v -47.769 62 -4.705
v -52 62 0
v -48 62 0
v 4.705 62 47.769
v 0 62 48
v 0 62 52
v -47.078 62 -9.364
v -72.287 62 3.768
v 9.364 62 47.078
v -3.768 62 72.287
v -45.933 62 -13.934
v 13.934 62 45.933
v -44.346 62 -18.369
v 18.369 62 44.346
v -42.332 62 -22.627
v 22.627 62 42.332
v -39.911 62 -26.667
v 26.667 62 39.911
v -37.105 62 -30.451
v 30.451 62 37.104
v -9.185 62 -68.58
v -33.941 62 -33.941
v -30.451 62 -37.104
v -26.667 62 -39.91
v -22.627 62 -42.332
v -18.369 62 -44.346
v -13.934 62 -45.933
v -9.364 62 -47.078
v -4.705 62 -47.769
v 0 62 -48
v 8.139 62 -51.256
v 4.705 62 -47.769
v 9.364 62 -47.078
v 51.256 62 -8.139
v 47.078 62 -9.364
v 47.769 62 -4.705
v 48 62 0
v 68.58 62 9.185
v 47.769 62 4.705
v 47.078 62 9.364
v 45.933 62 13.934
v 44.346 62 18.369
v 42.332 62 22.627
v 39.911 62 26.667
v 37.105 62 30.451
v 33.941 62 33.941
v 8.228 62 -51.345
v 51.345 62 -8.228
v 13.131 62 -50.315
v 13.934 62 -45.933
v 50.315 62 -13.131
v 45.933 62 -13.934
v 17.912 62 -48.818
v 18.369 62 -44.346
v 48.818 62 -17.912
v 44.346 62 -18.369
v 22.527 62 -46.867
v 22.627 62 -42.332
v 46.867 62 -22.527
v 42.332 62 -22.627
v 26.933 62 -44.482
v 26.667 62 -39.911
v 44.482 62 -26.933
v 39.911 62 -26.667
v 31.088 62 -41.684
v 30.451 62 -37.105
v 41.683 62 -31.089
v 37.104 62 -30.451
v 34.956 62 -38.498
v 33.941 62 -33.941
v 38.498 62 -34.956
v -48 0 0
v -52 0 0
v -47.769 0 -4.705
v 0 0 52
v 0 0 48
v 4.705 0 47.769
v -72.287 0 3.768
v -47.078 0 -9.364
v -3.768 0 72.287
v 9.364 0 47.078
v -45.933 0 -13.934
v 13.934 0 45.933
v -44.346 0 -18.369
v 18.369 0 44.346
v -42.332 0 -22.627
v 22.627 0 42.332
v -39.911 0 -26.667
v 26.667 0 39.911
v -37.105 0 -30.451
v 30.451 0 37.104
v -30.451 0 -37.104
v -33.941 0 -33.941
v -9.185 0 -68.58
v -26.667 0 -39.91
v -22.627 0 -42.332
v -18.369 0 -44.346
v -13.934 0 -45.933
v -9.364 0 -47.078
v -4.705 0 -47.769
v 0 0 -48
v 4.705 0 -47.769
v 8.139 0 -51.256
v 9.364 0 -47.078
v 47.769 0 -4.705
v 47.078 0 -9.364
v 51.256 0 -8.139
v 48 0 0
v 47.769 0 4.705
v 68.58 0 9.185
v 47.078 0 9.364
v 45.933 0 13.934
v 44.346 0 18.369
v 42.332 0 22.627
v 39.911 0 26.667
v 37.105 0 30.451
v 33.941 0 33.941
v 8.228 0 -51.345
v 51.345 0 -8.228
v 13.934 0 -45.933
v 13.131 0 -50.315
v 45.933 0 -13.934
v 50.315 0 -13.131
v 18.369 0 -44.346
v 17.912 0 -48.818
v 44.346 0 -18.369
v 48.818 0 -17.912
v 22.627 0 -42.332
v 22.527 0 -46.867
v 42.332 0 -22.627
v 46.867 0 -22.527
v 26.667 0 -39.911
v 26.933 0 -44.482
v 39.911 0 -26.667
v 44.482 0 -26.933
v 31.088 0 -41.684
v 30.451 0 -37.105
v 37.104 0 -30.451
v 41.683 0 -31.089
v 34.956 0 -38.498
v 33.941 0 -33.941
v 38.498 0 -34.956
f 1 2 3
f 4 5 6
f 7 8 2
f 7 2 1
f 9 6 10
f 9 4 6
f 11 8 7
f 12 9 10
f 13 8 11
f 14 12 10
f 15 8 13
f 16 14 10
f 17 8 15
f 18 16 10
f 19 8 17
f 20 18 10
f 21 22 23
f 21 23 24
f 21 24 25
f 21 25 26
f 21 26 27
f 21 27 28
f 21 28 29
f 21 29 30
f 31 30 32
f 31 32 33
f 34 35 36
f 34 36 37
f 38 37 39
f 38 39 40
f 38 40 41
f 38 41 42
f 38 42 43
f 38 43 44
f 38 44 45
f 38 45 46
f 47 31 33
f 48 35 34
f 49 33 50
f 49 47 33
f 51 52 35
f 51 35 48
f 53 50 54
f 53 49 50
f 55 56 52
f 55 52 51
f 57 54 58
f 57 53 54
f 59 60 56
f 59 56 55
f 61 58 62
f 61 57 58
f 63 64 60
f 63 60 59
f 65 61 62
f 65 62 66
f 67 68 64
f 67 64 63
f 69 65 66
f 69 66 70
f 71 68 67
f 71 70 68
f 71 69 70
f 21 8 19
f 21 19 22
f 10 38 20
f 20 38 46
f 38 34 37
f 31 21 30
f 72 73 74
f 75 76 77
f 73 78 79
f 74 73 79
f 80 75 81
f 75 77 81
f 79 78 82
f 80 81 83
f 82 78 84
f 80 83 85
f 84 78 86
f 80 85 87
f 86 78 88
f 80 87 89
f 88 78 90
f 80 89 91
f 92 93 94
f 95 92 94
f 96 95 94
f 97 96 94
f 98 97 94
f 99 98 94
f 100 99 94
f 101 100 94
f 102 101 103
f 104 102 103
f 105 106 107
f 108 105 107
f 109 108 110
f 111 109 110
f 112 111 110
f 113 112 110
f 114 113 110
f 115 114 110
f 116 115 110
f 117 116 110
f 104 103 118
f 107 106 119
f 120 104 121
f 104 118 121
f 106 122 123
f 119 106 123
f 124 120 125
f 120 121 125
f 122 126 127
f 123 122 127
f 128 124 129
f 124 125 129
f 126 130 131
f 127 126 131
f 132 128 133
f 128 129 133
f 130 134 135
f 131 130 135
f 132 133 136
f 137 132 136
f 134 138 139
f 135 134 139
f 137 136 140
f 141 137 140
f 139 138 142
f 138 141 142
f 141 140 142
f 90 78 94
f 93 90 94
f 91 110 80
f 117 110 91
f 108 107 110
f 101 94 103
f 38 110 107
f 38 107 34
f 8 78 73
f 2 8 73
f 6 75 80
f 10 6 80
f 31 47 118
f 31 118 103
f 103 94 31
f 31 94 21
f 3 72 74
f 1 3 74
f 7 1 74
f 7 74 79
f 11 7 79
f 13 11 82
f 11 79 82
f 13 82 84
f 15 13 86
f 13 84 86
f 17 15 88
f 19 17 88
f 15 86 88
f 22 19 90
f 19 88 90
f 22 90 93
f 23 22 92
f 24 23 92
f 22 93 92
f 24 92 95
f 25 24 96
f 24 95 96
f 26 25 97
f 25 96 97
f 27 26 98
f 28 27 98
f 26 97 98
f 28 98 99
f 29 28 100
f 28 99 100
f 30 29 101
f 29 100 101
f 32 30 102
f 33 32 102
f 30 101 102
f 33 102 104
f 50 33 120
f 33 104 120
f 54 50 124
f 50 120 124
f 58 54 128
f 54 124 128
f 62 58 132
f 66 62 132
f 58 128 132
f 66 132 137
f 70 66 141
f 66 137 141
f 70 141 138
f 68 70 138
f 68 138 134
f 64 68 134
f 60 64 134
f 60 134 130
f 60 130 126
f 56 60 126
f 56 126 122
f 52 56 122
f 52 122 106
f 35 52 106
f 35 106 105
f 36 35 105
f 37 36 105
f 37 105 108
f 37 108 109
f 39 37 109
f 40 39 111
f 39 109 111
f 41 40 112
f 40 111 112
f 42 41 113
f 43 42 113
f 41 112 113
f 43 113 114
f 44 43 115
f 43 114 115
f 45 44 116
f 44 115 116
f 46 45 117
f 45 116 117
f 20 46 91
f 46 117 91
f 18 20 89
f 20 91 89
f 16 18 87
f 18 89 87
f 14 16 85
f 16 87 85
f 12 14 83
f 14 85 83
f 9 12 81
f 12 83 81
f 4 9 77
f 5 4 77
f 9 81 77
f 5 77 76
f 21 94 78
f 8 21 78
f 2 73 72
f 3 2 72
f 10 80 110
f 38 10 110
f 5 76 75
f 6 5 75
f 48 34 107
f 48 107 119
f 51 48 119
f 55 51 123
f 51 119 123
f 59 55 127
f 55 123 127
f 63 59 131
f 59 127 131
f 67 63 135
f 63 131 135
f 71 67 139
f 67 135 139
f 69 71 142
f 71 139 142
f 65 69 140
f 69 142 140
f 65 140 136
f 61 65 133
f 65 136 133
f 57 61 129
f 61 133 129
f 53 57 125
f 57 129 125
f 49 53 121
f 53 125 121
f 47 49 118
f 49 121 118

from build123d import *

# Parameters (mm, degrees)
BOSS_EXTRUDE1_DEPTH = 62
SKETCH3_W           = 15
SKETCH3_H           = 80.278098872
CUT_EXTRUDE1_DEPTH  = 24.5
SKETCH4_W           = 18.12750906
SKETCH4_H           = 69.709686178
CUT_EXTRUDE2_DEPTH  = 24.5


with BuildPart() as part:
    # Sketch1 → Boss-Extrude1 (new body)
    with BuildSketch(Plane(origin=(0, 0, 0), x_dir=(1, 0, 0), z_dir=(0, 1, 0))):
        with BuildLine():
            Line((-52.000074422, -0.000131195), (-48, -0.000131195))
            ThreePointArc((-48, -0.000131195), (33.941079112, 33.941171881), (0, -48))
            Line((0, -48), (0, -52.000074422))
            Line((0, -52.000074422), (-3.768119303, -72.286566827))
            Line((-3.768119303, -72.286566827), (68.579771311, -9.185198192))
            Line((68.579771311, -9.185198192), (75.652096433, -2.112870208))
            Line((75.652096433, -2.112870208), (58.450826977, 15.088392287))
            Line((58.450826977, 15.088392287), (51.378501856, 8.016064304))
            ThreePointArc((51.378501856, 8.016064304), (36.769597807, 36.769612685), (8.016043515, 51.378505099))
            Line((8.016043515, 51.378505099), (15.088368636, 58.450833083))
            Line((15.088368636, 58.450833083), (-2.112934166, 75.652128925))
            Line((-2.112934166, 75.652128925), (-9.185259288, 68.579800942))
            Line((-9.185259288, 68.579800942), (-72.286524075, -3.768180248))
            Line((-72.286524075, -3.768180248), (-52.000074422, -0.000131195))
        make_face()
    extrude(amount=BOSS_EXTRUDE1_DEPTH)

    # Sketch3 → Cut-Extrude1 (cut)
    with BuildSketch(Plane(origin=(38.882498626, 0, 38.882482893), x_dir=(0.707106638, 0, -0.707106924), z_dir=(0.707106924, 0, 0.707106638))):
        with Locations((49.498294294, 40.139049436)):
            Rectangle(SKETCH3_W, SKETCH3_H)
    extrude(amount=-CUT_EXTRUDE1_DEPTH, mode=Mode.SUBTRACT)

    # Sketch4 → Cut-Extrude2 (cut)
    with BuildSketch(Plane(origin=(-38.882531973, 0, -38.88251624), x_dir=(-0.707106638, 0, 0.707106924), z_dir=(-0.707106924, 0, -0.707106638))):
        with Locations((-51.062048824, 34.854843089)):
            Rectangle(SKETCH4_W, SKETCH4_H)
    extrude(amount=-CUT_EXTRUDE2_DEPTH, mode=Mode.SUBTRACT)


solid = part.part
